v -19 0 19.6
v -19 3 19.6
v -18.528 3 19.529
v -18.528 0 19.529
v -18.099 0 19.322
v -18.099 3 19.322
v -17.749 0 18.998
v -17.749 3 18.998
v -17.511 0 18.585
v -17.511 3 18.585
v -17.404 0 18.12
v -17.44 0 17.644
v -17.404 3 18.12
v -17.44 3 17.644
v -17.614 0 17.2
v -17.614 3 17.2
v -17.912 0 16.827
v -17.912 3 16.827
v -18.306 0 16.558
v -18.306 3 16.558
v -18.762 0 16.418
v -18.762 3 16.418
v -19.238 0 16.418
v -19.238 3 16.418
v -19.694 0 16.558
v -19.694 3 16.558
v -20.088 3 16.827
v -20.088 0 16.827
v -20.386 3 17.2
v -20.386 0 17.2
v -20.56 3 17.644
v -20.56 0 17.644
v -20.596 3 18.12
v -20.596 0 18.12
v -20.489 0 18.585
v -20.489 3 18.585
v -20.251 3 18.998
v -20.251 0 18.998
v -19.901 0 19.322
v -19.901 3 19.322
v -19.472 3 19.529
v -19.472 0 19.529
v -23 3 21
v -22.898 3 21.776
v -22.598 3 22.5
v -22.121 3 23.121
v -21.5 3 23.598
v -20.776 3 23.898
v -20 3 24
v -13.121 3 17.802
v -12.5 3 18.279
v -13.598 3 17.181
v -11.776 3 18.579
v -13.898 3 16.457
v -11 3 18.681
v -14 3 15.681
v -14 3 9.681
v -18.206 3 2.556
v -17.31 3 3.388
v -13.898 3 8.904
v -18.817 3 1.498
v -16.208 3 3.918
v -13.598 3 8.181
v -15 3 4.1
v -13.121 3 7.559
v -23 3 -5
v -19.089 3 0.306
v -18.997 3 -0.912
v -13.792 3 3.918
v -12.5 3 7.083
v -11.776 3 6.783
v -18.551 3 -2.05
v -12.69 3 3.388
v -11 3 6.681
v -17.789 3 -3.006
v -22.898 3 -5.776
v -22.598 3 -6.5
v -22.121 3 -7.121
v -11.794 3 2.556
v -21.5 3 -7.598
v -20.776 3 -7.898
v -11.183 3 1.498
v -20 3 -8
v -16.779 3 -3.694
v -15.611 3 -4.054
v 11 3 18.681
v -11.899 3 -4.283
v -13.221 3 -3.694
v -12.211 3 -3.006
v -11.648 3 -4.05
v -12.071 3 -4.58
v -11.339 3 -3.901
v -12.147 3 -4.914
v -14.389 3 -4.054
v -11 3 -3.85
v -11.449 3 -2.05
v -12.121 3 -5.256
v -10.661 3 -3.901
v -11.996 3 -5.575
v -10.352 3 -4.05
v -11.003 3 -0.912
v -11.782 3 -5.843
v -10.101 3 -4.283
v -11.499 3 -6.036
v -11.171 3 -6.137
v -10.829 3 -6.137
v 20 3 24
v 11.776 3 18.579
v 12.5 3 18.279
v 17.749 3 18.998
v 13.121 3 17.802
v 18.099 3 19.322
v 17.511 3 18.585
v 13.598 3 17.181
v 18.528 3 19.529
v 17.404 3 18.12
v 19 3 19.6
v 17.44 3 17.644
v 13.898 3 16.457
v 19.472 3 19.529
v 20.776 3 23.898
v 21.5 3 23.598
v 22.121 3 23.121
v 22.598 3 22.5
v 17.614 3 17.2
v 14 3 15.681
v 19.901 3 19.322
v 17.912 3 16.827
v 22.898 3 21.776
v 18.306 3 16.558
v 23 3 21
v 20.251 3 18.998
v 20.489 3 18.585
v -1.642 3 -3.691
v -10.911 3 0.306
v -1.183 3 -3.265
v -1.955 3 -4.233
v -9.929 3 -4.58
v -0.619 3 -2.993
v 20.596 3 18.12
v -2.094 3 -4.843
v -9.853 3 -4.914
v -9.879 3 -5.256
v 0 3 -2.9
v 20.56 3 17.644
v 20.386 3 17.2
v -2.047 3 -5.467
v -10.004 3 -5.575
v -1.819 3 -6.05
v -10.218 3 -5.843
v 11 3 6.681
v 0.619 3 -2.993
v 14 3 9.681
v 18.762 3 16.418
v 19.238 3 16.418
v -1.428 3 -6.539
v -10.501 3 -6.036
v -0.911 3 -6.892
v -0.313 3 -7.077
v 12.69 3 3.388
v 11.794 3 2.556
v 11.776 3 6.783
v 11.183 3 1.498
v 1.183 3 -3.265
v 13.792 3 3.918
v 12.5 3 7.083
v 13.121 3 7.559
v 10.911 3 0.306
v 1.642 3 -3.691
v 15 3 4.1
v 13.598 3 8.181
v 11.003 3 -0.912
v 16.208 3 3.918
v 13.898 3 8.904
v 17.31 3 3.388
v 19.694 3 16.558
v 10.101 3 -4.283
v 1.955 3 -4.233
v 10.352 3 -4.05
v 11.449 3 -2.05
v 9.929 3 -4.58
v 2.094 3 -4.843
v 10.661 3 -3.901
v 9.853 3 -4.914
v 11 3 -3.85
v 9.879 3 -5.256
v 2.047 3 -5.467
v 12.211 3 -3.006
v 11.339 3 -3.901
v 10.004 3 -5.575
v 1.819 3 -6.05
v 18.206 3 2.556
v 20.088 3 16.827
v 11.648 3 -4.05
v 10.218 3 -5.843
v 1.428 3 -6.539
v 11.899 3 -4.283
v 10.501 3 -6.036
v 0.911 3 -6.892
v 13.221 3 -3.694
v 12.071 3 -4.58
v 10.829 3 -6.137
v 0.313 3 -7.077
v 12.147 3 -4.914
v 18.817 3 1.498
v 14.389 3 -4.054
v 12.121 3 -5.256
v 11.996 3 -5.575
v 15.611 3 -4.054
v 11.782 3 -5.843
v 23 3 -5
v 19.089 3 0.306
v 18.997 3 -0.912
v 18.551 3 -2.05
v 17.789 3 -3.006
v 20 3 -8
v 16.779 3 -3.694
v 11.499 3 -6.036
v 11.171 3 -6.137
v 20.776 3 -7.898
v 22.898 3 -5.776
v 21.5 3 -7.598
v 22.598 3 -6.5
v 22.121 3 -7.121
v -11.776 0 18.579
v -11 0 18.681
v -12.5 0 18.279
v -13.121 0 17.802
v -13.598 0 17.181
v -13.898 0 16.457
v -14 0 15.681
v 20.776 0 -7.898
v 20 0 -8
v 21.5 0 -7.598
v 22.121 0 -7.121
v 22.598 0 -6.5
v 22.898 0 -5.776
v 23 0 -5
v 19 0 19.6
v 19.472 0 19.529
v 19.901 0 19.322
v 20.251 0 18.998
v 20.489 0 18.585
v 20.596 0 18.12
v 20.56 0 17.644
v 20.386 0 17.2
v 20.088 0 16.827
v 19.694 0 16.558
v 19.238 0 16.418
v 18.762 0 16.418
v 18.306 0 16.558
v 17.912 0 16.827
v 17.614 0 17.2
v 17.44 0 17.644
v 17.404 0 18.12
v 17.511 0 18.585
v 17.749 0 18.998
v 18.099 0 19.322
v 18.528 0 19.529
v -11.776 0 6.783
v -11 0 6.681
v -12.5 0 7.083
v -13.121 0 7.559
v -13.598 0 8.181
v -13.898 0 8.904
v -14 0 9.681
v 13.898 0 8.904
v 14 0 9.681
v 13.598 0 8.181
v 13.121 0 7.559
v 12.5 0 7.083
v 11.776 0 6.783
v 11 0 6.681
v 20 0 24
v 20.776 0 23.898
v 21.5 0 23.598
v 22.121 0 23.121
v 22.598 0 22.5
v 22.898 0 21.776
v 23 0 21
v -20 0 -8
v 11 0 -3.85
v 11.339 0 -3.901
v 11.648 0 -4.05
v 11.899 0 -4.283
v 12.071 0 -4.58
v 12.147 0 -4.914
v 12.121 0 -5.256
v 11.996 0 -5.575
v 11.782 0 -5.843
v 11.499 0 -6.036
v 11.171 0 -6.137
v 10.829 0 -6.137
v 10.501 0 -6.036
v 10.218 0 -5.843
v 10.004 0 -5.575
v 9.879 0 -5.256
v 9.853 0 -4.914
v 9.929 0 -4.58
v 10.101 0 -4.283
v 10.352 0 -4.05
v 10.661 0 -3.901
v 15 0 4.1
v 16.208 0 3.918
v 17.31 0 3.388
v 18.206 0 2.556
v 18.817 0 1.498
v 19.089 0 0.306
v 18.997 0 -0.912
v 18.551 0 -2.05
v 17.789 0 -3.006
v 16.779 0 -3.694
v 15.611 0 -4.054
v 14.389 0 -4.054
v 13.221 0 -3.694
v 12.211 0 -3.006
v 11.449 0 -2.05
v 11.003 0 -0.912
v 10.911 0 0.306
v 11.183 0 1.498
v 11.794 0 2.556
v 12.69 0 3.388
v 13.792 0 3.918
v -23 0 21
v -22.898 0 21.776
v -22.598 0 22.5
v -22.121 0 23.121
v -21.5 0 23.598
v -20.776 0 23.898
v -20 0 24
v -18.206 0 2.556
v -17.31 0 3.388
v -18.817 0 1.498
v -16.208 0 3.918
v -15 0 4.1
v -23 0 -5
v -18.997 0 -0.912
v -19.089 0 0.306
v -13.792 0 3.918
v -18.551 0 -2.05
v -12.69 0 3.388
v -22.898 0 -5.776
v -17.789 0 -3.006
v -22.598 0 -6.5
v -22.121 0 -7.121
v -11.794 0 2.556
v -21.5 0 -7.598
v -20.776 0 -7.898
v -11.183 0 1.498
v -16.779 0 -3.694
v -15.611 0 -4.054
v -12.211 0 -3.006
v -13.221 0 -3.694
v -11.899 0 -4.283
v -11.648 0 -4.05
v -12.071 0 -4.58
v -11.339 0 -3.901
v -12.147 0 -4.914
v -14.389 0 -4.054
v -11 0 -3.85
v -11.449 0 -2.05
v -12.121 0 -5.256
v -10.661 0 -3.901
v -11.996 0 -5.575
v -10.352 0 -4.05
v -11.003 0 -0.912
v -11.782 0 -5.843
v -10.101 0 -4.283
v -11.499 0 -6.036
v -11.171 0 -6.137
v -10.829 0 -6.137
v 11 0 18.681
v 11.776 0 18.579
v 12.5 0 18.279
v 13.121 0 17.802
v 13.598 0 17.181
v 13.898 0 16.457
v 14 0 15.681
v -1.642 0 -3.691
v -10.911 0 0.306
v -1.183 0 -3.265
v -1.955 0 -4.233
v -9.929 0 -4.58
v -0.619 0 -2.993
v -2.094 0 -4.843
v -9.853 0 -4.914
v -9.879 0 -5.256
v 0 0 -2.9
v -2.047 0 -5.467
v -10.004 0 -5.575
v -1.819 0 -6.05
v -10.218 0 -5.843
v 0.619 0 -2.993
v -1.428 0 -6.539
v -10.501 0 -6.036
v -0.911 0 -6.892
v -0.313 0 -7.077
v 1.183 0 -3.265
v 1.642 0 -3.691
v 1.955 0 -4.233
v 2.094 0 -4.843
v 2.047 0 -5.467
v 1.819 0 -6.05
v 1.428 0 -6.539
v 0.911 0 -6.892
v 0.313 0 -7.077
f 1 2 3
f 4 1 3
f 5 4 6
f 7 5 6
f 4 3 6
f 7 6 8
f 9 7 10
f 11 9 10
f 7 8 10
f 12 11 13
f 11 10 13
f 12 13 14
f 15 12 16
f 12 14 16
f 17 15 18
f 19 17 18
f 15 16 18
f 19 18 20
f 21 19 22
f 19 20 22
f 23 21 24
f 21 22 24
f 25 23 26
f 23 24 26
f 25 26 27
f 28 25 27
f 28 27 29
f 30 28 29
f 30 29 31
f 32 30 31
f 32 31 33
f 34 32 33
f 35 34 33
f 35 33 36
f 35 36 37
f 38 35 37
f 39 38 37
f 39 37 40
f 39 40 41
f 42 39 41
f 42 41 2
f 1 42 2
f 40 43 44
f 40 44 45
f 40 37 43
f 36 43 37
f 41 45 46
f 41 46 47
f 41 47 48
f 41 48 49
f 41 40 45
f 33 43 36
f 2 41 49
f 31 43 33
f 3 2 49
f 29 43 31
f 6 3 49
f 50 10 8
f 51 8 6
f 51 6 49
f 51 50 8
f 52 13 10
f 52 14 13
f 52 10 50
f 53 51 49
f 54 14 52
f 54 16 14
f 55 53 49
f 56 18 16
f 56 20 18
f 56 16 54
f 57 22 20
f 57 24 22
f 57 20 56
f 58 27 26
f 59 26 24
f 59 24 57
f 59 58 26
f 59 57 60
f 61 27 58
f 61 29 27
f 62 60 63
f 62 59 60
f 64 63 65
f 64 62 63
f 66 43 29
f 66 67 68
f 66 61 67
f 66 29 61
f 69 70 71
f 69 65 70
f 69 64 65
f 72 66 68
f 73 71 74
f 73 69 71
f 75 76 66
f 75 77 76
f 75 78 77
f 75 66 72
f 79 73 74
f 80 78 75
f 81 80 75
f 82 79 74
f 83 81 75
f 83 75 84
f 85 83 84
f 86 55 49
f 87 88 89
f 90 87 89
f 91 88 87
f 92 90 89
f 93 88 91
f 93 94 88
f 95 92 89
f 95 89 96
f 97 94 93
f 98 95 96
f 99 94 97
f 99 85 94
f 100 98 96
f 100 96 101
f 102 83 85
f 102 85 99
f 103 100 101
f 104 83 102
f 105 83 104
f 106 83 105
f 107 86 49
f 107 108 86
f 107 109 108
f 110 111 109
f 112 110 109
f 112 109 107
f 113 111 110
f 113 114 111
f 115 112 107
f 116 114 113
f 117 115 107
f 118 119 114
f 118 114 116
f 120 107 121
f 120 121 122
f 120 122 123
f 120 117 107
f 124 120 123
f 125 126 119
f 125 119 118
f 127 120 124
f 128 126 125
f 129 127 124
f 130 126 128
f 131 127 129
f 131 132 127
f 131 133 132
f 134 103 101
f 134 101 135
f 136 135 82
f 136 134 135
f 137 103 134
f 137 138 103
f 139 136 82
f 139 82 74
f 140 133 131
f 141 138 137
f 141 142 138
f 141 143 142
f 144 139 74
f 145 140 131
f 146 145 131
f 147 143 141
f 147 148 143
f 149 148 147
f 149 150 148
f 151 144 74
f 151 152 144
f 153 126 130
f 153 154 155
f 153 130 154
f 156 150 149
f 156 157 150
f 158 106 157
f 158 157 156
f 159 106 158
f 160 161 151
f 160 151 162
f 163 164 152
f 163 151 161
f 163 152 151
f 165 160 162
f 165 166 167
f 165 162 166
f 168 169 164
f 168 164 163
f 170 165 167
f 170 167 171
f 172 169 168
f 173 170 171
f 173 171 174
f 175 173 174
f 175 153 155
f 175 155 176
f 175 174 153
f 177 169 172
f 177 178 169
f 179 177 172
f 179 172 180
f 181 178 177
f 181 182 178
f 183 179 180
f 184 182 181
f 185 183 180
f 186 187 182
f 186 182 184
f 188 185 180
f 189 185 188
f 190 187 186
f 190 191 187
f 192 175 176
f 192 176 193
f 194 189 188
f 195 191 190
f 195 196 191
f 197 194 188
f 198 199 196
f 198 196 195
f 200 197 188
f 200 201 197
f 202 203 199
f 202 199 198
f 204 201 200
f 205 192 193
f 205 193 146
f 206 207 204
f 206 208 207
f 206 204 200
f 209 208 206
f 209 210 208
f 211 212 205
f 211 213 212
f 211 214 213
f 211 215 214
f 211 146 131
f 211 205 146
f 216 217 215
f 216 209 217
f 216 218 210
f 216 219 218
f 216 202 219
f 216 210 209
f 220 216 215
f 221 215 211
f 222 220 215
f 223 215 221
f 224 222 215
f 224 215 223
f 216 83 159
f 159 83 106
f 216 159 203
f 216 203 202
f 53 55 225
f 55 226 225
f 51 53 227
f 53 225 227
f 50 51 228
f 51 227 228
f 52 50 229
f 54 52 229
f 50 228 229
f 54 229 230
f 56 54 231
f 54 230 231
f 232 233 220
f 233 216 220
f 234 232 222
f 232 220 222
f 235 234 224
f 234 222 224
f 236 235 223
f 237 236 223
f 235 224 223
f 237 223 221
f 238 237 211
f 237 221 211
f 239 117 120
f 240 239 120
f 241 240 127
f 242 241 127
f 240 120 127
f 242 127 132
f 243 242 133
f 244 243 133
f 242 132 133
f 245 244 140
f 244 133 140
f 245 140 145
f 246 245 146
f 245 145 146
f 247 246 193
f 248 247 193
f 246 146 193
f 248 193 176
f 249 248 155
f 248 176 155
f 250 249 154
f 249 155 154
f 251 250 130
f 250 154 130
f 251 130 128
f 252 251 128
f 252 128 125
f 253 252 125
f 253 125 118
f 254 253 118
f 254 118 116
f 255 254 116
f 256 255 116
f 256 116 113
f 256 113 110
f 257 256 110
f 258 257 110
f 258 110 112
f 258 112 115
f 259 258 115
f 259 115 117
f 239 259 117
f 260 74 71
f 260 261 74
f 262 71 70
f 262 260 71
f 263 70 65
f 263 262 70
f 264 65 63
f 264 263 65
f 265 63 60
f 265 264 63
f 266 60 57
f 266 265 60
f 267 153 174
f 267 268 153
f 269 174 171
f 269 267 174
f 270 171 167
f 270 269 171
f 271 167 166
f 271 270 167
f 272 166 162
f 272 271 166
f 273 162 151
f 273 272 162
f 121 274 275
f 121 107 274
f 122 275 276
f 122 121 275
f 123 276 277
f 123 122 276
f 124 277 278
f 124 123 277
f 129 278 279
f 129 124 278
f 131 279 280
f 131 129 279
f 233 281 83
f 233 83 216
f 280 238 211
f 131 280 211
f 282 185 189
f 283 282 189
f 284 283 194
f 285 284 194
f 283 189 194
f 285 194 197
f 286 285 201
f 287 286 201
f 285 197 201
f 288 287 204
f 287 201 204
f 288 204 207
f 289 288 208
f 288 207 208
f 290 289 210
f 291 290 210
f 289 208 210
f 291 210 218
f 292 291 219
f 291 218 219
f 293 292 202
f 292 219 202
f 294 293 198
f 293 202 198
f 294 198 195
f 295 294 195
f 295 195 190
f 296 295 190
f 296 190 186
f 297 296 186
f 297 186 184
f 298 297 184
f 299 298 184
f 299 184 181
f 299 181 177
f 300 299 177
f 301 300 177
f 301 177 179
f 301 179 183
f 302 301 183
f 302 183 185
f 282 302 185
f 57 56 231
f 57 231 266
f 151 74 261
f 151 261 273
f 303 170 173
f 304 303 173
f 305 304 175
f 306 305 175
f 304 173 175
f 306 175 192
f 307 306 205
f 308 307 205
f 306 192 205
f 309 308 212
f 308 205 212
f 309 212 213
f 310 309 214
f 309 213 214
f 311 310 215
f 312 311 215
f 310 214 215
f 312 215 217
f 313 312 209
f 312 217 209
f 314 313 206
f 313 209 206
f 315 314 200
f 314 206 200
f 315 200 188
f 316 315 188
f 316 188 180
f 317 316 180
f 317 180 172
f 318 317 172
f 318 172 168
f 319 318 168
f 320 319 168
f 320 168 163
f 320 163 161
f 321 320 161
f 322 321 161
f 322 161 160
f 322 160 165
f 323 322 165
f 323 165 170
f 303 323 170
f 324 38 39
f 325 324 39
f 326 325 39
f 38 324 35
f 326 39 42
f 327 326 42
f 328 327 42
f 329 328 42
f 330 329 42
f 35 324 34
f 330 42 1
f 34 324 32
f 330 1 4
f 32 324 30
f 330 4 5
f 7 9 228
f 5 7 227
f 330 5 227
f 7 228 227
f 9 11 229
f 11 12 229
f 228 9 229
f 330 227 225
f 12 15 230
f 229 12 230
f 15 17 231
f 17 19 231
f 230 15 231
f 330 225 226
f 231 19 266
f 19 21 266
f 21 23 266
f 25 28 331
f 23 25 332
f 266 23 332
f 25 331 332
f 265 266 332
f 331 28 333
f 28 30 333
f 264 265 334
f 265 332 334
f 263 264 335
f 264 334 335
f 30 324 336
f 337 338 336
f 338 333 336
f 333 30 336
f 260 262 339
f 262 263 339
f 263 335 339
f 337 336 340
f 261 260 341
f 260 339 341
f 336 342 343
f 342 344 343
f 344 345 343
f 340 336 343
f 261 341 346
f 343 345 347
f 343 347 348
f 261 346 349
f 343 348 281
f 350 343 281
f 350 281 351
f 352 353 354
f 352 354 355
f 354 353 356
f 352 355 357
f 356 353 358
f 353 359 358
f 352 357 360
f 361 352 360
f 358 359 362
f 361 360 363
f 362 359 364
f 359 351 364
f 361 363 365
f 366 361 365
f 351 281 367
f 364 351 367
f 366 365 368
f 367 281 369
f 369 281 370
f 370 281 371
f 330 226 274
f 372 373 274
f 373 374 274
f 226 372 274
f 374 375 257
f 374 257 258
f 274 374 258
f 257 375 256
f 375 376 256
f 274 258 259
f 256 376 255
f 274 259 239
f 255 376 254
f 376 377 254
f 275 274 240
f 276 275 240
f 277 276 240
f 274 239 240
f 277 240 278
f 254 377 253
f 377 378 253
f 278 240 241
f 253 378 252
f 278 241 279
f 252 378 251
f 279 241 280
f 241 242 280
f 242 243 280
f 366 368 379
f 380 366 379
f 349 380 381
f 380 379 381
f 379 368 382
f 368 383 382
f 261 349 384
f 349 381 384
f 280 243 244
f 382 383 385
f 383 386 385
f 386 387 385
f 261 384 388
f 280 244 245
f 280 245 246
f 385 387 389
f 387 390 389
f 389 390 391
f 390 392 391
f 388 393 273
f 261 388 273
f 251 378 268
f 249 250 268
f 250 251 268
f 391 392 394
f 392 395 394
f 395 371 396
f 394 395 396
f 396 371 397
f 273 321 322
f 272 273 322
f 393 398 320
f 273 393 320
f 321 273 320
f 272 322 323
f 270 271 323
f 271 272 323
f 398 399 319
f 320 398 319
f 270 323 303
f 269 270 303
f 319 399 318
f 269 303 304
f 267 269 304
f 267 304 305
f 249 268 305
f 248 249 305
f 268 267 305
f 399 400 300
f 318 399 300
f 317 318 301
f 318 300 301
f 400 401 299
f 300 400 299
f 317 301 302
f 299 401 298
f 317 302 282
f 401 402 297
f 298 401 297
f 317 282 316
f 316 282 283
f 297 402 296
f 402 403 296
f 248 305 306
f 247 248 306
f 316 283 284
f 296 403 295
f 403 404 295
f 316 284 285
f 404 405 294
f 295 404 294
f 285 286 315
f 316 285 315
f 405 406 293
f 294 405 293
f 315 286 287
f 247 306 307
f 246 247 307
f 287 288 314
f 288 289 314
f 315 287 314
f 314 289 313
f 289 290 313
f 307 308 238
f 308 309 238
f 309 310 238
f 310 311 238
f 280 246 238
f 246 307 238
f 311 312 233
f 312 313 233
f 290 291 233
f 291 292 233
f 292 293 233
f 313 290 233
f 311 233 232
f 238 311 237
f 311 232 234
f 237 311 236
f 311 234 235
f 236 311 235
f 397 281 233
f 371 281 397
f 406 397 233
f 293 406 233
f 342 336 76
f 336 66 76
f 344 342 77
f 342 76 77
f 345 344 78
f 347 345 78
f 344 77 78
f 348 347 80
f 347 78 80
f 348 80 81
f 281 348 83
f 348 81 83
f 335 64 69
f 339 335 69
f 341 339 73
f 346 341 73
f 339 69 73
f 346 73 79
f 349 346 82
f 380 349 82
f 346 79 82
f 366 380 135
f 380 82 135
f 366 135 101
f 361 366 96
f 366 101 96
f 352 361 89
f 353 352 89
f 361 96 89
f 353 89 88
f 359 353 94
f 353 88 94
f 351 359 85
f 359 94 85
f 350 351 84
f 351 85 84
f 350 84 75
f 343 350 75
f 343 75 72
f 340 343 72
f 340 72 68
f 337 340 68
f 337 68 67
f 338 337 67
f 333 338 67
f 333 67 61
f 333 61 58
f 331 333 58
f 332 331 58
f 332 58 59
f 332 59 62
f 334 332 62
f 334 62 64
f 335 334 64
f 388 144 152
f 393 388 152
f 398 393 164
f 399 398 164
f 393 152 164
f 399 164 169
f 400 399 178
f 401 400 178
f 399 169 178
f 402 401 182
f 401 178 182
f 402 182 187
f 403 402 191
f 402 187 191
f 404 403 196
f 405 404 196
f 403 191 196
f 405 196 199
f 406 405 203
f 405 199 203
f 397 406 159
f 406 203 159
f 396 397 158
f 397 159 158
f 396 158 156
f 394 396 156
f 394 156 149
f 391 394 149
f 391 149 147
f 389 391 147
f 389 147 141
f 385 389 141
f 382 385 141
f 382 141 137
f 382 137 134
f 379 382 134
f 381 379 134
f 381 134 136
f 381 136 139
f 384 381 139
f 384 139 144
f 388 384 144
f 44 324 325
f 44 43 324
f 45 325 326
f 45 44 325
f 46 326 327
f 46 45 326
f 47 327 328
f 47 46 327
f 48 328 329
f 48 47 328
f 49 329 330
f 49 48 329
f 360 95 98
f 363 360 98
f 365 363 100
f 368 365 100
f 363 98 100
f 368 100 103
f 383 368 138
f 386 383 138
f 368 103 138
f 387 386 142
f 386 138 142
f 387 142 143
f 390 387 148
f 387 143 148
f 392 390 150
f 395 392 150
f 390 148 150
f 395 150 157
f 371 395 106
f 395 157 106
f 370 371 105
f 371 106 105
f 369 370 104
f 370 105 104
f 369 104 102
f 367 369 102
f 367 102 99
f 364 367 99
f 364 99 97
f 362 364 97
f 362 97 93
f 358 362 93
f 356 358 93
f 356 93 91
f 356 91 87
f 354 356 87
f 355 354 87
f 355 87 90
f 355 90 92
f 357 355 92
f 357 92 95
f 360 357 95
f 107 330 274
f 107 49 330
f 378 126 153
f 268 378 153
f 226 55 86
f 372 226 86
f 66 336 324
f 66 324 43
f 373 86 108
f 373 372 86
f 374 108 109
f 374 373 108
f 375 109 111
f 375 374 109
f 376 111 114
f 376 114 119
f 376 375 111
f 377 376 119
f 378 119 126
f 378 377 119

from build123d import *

# Parameters (mm, degrees)
SKETCH_4_W          = 46
SKETCH_4_H          = 16
EXTRUDE_3_DEPTH     = 3
CUT_EXTRUDE_1_REACH = 26.536
SKETCH_5_R          = 4.1
SKETCH_6_W          = 46
SKETCH_6_H          = 3
EXTRUDE_4_DEPTH     = 16
CUT_EXTRUDE_2_REACH = 35.377
SKETCH_9_R          = 1.6
CUT_EXTRUDE_4_REACH = 35.377
SKETCH_11_R         = 1.15
SKETCH_11_R_2       = 2.1
CUT_EXTRUDE_5_REACH = 35.377
SKETCH_12_W         = 28
SKETCH_12_H         = 12
FILLET_3_R          = 3


with BuildPart() as part:
    # 草图4 → 凸台-拉伸3 (new body)
    with BuildSketch(Plane(origin=(0, 0, 0), x_dir=(1, 0, 0), z_dir=(0, 1, 0))):
        Rectangle(SKETCH_4_W, SKETCH_4_H)
    extrude(amount=EXTRUDE_3_DEPTH)

    # 草图5 → 切除-拉伸1 (cut, up to next)
    with BuildSketch(Plane(origin=(0, 3, 0), x_dir=(1, 0, 0), z_dir=(0, 1, 0)), mode=Mode.PRIVATE) as cut_extrude_1_sk1:
        with Locations(Location((-15, 0, 0), (0, 0, 270))):
            Circle(SKETCH_5_R)
    cut_extrude_1_tool1 = extrude(cut_extrude_1_sk1.sketch, amount=-CUT_EXTRUDE_1_REACH, mode=Mode.PRIVATE) & part.part
    # 草图5 → 切除-拉伸1 (cut, up to next)
    with BuildSketch(Plane(origin=(0, 3, 0), x_dir=(1, 0, 0), z_dir=(0, 1, 0)), mode=Mode.PRIVATE) as cut_extrude_1_sk2:
        with Locations(Location((15, 0, 0), (0, 0, 270))):
            Circle(SKETCH_5_R)
    cut_extrude_1_tool2 = extrude(cut_extrude_1_sk2.sketch, amount=-CUT_EXTRUDE_1_REACH, mode=Mode.PRIVATE) & part.part
    add(cut_extrude_1_tool1.solids().sort_by_distance((-15, 3, 0))[0], mode=Mode.SUBTRACT)
    add(cut_extrude_1_tool2.solids().sort_by_distance((15, 3, 0))[0], mode=Mode.SUBTRACT)

    # 草图6 → 凸台-拉伸4 (add)
    with BuildSketch(Plane.XY.offset(8)):
        with Locations((0, 1.5)):
            Rectangle(SKETCH_6_W, SKETCH_6_H)
    extrude(amount=EXTRUDE_4_DEPTH)

    # 草图9 → 切除-拉伸2 (cut, up to next)
    with BuildSketch(Plane(origin=(0, 3, 0), x_dir=(1, 0, 0), z_dir=(0, 1, 0)), mode=Mode.PRIVATE) as cut_extrude_2_sk1:
        with Locations(Location((-19, -18, 0), (0, 0, 270))):
            Circle(SKETCH_9_R)
    cut_extrude_2_tool1 = extrude(cut_extrude_2_sk1.sketch, amount=-CUT_EXTRUDE_2_REACH, mode=Mode.PRIVATE) & part.part
    # 草图9 → 切除-拉伸2 (cut, up to next)
    with BuildSketch(Plane(origin=(0, 3, 0), x_dir=(1, 0, 0), z_dir=(0, 1, 0)), mode=Mode.PRIVATE) as cut_extrude_2_sk2:
        with Locations(Location((19, -18, 0), (0, 0, 270))):
            Circle(SKETCH_9_R)
    cut_extrude_2_tool2 = extrude(cut_extrude_2_sk2.sketch, amount=-CUT_EXTRUDE_2_REACH, mode=Mode.PRIVATE) & part.part
    add(cut_extrude_2_tool1.solids().sort_by_distance((-19, 3, 18))[0], mode=Mode.SUBTRACT)
    add(cut_extrude_2_tool2.solids().sort_by_distance((19, 3, 18))[0], mode=Mode.SUBTRACT)

    # 草图11 → 切除-拉伸4 (cut, up to next)
    with BuildSketch(Plane(origin=(0, 3, 0), x_dir=(1, 0, 0), z_dir=(0, 1, 0)), mode=Mode.PRIVATE) as cut_extrude_4_sk1:
        with Locations(Location((-11, 5, 0), (0, 0, 270))):
            Circle(SKETCH_11_R)
    cut_extrude_4_tool1 = extrude(cut_extrude_4_sk1.sketch, amount=-CUT_EXTRUDE_4_REACH, mode=Mode.PRIVATE) & part.part
    # 草图11 → 切除-拉伸4 (cut, up to next)
    with BuildSketch(Plane(origin=(0, 3, 0), x_dir=(1, 0, 0), z_dir=(0, 1, 0)), mode=Mode.PRIVATE) as cut_extrude_4_sk2:
        with Locations(Location((11, 5, 0), (0, 0, 270))):
            Circle(SKETCH_11_R)
    cut_extrude_4_tool2 = extrude(cut_extrude_4_sk2.sketch, amount=-CUT_EXTRUDE_4_REACH, mode=Mode.PRIVATE) & part.part
    # 草图11 → 切除-拉伸4 (cut, up to next)
    with BuildSketch(Plane(origin=(0, 3, 0), x_dir=(1, 0, 0), z_dir=(0, 1, 0)), mode=Mode.PRIVATE) as cut_extrude_4_sk3:
        with Locations(Location((0, 5, 0), (0, 0, 270))):
            Circle(SKETCH_11_R_2)
    cut_extrude_4_tool3 = extrude(cut_extrude_4_sk3.sketch, amount=-CUT_EXTRUDE_4_REACH, mode=Mode.PRIVATE) & part.part
    add(cut_extrude_4_tool1.solids().sort_by_distance((-11, 3, -5))[0], mode=Mode.SUBTRACT)
    add(cut_extrude_4_tool2.solids().sort_by_distance((11, 3, -5))[0], mode=Mode.SUBTRACT)
    add(cut_extrude_4_tool3.solids().sort_by_distance((0, 3, -5))[0], mode=Mode.SUBTRACT)

    # 草图12 → 切除-拉伸5 (cut, up to next)
    with BuildSketch(Plane(origin=(0, 3, 0), x_dir=(1, 0, 0), z_dir=(0, 1, 0)), mode=Mode.PRIVATE) as cut_extrude_5_sk1:
        with Locations((0, -12.680818863)):
            Rectangle(SKETCH_12_W, SKETCH_12_H)
    cut_extrude_5_tool1 = extrude(cut_extrude_5_sk1.sketch, amount=-CUT_EXTRUDE_5_REACH, mode=Mode.PRIVATE) & part.part
    add(cut_extrude_5_tool1.solids().sort_by_distance((0, 3, 12.680819))[0], mode=Mode.SUBTRACT)

    # 圆角3
    fillet_3_edges = [part.edges().sort_by_distance(p)[0] for p in [
        (-23, 1.5, 24),
        (23, 1.5, 24),
        (14, 1.5, 6.680818863),
        (14, 1.5, 18.680818863),
        (-14, 1.5, 18.680818863),
        (-14, 1.5, 6.680818863),
        (-23, 1.5, -8),
        (23, 1.5, -8),
    ]]
    fillet(fillet_3_edges, radius=FILLET_3_R)


solid = part.part
